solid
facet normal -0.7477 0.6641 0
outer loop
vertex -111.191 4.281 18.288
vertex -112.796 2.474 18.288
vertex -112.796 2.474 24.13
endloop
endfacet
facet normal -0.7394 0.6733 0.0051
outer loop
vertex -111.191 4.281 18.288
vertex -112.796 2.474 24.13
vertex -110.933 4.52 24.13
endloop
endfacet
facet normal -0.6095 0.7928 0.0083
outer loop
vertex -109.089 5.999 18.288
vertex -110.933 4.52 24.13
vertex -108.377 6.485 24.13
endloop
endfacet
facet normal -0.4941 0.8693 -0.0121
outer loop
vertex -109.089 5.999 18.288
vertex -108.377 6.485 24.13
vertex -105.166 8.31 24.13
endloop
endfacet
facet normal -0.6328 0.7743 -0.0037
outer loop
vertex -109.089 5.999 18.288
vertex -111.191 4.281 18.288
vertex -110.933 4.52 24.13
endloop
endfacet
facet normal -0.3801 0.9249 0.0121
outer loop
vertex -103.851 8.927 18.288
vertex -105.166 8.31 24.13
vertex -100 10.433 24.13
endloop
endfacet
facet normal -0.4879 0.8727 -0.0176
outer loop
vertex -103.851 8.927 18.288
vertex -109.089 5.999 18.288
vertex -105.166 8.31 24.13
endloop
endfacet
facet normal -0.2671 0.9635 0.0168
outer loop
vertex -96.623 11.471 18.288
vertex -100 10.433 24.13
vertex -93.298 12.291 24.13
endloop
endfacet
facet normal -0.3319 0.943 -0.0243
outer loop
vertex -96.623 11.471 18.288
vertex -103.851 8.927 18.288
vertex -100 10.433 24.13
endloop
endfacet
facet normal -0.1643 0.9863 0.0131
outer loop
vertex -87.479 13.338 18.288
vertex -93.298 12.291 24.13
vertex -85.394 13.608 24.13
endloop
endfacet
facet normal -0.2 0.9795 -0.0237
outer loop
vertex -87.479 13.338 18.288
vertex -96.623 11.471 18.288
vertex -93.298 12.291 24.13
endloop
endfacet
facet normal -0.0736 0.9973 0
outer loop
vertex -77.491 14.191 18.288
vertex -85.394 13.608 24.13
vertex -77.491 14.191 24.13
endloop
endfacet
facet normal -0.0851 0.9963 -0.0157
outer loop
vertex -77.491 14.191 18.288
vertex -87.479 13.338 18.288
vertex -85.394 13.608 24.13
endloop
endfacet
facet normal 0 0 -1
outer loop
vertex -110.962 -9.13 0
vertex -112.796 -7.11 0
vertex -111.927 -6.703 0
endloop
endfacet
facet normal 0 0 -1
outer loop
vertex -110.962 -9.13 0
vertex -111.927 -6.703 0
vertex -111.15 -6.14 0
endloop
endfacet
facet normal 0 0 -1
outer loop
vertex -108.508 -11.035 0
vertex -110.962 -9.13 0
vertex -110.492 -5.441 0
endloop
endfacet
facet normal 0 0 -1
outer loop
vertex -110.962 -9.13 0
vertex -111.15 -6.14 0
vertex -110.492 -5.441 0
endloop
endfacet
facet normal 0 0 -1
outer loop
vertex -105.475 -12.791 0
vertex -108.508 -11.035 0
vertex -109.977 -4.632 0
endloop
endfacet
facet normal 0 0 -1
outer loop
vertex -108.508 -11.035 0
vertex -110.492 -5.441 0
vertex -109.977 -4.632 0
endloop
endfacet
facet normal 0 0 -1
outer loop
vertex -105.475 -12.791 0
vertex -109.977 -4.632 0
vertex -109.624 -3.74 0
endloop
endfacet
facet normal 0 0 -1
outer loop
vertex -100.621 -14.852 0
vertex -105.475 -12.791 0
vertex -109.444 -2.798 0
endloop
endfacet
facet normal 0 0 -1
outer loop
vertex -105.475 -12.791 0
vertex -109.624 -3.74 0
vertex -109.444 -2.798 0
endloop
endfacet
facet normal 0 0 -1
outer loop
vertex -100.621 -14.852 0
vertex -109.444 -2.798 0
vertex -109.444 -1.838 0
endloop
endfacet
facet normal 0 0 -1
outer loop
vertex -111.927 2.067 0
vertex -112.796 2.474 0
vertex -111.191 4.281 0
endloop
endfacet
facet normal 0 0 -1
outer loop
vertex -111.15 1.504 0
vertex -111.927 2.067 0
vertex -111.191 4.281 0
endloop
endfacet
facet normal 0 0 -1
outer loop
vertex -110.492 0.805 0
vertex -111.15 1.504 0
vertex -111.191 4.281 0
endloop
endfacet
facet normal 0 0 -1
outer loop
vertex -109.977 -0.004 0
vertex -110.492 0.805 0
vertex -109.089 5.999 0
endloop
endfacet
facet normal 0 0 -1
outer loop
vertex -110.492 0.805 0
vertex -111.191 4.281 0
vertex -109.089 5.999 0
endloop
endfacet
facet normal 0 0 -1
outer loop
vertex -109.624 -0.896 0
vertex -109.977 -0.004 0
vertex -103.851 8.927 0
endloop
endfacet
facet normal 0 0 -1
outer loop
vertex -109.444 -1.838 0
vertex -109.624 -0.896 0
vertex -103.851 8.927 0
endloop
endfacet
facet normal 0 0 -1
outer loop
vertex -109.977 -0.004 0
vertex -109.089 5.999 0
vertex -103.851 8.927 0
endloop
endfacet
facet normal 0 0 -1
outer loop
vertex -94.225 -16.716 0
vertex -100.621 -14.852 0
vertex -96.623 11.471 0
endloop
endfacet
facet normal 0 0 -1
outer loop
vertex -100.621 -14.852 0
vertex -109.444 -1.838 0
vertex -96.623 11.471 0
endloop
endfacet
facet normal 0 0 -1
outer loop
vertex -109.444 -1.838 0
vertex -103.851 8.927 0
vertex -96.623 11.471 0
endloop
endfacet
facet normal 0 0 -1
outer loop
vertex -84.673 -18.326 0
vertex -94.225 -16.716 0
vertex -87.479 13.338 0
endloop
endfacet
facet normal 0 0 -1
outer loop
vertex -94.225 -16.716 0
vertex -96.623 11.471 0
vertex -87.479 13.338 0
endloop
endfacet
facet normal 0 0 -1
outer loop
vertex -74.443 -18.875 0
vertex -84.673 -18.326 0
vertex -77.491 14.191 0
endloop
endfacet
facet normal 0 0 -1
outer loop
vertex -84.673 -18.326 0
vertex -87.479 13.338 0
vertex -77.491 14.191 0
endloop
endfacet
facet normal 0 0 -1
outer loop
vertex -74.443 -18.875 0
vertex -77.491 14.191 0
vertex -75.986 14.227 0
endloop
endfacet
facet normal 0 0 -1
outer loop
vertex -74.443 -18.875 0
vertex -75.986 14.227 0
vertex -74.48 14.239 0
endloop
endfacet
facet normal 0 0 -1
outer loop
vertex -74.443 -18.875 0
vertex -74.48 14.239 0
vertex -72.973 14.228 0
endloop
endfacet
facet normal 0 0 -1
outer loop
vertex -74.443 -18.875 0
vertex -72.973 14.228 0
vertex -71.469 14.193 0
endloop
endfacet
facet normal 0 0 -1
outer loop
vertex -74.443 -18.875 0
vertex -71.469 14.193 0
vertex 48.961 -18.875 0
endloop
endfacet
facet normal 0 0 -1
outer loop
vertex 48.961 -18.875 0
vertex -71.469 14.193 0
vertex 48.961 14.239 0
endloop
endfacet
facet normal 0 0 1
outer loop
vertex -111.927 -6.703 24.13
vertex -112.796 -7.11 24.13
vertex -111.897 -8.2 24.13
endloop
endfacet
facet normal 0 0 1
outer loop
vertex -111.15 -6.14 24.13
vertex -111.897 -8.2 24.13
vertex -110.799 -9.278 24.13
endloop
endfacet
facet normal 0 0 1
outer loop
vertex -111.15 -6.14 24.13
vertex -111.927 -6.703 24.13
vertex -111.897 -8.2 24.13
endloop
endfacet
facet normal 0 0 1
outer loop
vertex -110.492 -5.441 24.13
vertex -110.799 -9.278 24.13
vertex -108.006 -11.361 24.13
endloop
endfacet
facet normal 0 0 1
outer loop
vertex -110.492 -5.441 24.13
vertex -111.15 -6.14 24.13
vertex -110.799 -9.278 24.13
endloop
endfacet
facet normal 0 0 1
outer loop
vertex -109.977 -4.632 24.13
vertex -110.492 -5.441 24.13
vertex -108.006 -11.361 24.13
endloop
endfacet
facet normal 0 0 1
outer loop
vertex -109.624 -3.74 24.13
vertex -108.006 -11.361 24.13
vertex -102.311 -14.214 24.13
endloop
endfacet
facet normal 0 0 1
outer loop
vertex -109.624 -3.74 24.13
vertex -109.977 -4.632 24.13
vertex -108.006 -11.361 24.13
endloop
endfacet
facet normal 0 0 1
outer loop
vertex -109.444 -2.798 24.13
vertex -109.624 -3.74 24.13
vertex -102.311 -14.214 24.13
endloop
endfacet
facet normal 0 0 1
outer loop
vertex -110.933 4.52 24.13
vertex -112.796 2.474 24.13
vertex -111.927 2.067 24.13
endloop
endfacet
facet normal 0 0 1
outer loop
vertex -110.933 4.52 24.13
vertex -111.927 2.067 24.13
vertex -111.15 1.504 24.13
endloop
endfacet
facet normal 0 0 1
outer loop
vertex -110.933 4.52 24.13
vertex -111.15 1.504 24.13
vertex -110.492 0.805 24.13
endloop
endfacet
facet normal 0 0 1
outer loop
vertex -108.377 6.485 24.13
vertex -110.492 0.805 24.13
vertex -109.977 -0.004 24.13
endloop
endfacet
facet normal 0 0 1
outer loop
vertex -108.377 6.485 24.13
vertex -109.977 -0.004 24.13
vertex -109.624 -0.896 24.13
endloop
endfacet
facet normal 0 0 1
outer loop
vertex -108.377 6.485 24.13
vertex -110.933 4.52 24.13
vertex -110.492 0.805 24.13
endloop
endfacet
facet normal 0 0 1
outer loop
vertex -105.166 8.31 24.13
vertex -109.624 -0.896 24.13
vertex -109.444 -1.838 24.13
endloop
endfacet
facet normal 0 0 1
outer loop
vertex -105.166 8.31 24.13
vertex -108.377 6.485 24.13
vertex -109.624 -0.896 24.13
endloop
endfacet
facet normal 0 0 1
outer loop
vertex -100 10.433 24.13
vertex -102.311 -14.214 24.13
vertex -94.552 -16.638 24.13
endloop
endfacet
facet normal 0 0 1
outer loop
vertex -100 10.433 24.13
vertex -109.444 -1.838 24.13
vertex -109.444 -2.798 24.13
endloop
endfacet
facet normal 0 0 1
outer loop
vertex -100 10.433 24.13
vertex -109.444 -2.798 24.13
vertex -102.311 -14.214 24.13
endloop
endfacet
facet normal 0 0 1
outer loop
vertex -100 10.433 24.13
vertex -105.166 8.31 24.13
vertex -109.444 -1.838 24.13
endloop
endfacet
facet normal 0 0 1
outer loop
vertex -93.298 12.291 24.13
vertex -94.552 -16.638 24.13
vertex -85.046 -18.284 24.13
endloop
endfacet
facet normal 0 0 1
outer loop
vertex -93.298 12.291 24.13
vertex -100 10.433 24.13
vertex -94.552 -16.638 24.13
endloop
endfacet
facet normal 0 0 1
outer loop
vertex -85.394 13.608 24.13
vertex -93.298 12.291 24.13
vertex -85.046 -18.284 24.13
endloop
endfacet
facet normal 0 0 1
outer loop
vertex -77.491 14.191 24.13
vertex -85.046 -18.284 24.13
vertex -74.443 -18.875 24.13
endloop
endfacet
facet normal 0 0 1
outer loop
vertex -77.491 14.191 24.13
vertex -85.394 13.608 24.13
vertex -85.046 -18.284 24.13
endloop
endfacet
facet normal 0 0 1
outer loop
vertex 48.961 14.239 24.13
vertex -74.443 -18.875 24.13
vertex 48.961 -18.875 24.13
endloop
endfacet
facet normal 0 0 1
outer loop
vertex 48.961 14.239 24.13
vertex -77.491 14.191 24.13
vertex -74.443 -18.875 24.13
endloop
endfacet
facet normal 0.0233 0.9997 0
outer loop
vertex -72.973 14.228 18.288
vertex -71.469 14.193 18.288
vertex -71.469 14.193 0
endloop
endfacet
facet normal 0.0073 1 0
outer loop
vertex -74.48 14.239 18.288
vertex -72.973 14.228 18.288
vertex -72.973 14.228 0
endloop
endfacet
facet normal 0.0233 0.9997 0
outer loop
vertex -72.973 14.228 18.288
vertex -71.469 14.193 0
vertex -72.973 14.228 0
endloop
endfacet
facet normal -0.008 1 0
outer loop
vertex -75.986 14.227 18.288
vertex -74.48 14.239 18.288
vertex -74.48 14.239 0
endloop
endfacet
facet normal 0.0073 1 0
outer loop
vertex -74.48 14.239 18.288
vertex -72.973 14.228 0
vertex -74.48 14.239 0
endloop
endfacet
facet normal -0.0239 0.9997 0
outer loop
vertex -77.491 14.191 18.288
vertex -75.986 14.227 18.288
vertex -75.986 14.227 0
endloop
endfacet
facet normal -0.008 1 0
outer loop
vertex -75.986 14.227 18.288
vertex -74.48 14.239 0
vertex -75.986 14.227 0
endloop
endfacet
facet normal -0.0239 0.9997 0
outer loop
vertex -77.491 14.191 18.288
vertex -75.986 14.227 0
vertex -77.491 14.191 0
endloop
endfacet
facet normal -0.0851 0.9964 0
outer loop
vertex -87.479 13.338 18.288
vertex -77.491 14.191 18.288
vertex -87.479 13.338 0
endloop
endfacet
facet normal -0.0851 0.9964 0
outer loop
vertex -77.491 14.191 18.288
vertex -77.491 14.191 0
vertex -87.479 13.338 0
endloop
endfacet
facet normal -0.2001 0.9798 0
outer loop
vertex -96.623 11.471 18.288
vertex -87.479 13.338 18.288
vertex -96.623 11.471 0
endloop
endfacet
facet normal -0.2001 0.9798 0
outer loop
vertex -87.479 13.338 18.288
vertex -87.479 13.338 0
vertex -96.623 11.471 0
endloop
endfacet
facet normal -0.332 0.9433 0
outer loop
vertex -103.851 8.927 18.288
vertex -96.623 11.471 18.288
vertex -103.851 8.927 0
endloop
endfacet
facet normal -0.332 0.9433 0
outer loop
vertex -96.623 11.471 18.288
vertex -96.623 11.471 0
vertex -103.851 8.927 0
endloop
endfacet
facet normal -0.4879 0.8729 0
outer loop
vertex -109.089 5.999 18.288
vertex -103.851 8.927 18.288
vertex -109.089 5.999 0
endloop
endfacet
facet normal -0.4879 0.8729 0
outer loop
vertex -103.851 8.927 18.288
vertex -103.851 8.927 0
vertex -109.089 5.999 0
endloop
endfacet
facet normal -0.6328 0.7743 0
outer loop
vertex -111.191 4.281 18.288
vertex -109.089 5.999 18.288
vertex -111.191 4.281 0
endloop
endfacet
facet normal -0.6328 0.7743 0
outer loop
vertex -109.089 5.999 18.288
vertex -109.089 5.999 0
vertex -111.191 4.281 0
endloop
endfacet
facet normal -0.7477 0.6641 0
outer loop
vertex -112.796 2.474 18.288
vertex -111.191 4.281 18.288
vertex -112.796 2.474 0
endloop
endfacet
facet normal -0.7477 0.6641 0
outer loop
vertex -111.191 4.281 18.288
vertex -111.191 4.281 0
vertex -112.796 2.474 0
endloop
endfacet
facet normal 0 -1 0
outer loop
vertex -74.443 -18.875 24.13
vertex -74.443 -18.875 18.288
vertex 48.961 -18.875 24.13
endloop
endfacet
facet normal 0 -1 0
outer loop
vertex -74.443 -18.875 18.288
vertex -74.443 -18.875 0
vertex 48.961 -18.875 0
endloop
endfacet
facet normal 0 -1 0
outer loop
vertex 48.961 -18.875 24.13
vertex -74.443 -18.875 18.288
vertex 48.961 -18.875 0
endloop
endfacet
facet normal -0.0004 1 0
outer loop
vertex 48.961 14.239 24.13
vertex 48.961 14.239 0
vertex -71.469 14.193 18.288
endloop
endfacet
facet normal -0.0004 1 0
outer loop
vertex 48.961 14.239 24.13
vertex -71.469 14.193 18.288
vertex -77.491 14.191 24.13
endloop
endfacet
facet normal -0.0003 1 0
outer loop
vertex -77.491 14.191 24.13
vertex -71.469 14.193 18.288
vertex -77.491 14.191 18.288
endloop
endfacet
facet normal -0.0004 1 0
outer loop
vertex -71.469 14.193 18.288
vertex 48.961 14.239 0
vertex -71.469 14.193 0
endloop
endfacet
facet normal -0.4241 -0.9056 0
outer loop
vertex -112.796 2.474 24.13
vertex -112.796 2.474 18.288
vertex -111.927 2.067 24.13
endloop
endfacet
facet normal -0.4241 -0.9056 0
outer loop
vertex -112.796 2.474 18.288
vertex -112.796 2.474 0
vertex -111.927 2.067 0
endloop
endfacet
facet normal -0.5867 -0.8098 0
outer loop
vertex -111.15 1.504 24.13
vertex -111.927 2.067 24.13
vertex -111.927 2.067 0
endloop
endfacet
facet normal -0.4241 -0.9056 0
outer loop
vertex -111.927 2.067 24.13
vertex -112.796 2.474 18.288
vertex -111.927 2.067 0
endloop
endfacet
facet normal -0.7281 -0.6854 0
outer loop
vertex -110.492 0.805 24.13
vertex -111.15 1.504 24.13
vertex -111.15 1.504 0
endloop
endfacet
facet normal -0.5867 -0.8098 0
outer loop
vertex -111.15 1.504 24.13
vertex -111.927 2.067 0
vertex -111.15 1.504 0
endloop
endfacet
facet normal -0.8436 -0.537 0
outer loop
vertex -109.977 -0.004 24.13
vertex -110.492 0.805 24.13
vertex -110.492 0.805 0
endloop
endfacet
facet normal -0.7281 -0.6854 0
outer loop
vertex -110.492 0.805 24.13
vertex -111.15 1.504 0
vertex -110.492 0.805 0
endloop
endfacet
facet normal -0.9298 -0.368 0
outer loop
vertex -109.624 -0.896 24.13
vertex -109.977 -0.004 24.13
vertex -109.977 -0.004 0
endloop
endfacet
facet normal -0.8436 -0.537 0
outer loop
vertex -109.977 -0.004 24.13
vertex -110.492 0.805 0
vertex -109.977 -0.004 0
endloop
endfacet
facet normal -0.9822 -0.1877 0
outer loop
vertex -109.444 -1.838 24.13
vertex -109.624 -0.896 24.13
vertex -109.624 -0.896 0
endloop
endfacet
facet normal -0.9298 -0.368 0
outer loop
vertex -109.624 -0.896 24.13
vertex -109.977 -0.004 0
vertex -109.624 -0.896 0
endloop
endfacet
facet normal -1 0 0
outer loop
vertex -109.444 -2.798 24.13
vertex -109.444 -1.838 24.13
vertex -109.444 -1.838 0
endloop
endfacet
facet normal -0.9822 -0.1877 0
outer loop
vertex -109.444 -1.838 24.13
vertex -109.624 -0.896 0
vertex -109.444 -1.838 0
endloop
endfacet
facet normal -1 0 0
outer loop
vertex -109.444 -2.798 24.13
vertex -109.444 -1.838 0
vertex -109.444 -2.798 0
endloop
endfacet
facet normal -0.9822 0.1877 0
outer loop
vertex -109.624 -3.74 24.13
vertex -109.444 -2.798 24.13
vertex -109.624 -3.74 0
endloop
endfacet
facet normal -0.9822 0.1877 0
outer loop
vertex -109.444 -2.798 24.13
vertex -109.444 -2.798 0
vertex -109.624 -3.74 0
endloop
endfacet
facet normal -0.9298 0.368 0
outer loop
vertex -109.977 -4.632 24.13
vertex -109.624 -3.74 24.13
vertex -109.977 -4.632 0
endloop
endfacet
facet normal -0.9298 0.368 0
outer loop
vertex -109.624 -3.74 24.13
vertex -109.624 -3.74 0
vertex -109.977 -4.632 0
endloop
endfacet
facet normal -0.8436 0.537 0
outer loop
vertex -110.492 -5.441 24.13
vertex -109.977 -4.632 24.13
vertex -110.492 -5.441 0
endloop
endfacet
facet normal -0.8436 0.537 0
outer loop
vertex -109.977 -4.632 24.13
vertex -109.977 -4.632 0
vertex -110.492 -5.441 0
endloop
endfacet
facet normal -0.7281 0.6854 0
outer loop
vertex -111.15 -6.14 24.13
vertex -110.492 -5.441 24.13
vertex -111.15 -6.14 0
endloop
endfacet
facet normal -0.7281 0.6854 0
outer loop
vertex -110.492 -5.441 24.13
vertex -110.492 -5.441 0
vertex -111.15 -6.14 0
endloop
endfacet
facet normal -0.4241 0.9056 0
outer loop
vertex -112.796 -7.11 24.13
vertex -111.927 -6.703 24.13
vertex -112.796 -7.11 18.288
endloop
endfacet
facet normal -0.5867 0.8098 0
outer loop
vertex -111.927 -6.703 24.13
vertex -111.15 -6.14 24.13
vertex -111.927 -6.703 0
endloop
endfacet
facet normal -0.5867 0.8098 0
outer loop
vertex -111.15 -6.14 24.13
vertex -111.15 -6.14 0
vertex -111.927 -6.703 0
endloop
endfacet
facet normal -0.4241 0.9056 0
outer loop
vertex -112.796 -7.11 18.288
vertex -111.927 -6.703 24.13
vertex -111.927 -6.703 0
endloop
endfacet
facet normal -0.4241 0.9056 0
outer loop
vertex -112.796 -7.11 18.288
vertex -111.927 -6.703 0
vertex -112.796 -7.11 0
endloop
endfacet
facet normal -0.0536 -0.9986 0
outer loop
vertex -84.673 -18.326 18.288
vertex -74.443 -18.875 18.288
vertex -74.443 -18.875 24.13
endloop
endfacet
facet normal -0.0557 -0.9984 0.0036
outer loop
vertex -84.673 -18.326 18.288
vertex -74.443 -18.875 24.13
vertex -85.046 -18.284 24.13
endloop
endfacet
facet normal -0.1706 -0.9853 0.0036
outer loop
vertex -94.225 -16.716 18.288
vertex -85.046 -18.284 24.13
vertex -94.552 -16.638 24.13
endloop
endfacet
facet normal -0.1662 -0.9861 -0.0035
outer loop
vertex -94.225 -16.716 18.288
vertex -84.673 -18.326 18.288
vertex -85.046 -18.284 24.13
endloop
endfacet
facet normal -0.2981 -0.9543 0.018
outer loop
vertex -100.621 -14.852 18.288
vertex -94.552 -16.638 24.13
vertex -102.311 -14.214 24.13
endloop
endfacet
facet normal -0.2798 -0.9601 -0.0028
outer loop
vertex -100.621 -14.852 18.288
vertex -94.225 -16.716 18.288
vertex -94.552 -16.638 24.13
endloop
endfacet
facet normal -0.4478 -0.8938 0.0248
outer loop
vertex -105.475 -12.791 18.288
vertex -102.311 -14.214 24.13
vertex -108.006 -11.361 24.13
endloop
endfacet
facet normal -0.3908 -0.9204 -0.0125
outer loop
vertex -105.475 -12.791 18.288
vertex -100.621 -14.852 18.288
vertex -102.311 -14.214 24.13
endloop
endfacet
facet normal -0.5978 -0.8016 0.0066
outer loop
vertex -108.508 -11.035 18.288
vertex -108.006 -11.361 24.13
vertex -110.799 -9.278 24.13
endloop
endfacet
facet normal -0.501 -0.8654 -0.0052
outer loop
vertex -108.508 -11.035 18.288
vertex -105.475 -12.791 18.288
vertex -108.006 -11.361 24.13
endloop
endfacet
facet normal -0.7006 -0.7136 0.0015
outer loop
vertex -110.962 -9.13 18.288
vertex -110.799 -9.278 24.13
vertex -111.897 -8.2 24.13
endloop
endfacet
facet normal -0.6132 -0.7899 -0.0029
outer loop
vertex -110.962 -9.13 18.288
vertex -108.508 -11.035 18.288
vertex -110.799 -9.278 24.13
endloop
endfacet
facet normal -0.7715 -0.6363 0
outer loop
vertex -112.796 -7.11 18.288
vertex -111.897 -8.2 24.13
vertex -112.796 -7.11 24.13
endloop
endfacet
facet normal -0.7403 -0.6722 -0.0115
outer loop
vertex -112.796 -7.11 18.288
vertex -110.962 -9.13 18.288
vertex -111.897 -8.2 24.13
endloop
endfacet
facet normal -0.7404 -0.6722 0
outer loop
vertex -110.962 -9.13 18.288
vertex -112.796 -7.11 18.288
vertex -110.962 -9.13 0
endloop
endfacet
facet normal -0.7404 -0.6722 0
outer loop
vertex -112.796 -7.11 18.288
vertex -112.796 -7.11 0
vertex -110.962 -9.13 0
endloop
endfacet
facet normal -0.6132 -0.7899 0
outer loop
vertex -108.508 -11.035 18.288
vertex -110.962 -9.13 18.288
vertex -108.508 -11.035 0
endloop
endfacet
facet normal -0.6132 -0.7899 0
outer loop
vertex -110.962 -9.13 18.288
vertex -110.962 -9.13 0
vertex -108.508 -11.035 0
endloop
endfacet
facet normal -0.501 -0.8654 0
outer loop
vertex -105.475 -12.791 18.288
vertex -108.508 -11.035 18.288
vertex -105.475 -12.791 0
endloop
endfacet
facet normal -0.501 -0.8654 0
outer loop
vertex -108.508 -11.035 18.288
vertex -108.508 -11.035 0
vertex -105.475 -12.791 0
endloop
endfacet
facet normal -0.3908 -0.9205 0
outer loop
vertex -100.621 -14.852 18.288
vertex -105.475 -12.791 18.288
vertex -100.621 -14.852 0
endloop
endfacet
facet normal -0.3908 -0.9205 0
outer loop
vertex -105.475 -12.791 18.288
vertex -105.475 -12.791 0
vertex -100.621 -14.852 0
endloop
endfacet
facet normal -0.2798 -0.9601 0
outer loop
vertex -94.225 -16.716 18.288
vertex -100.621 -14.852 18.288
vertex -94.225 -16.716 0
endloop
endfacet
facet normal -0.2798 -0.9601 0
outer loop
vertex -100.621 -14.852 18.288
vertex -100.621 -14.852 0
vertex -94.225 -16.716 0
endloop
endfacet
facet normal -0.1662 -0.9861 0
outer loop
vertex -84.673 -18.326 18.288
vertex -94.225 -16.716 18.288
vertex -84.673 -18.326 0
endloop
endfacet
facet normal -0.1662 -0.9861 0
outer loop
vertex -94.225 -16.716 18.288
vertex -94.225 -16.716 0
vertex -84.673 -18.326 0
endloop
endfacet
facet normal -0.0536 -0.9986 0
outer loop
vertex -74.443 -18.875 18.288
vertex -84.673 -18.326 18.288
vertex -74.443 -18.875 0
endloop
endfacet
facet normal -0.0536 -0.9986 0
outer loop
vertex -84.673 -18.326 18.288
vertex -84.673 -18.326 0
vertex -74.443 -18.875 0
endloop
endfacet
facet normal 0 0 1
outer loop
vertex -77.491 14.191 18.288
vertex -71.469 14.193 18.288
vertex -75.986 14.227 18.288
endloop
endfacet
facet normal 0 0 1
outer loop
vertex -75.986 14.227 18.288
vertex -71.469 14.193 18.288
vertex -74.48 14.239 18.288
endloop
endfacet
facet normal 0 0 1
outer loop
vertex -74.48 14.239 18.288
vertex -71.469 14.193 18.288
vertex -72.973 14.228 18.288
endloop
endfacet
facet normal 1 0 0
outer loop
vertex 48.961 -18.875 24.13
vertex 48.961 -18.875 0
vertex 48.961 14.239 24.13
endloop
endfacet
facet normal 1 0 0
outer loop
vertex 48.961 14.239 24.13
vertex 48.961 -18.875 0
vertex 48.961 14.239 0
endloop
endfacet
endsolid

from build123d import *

# Parameters (mm, degrees)
SKETCH1_RX          = 40.067331288
SKETCH1_RY          = 16.556748466
BOSS_EXTRUDE1_DEPTH = 18.288
BOSS_EXTRUDE2_DEPTH = 24.13
SKETCH4_R           = 5.089278313
CUT_EXTRUDE1_DEPTH  = 49.784


with BuildPart() as part:
    # Sketch1 → Boss-Extrude1 (new body)
    with BuildSketch(Plane.XY):
        with Locations(Location((-74.44297323, -2.317944785), (0, 0, 180))):
            Ellipse(SKETCH1_RX, SKETCH1_RY)
    extrude(amount=BOSS_EXTRUDE1_DEPTH)

    # Sketch3 → Boss-Extrude2 (add)
    with BuildSketch(Plane(origin=(0, 0, 0), x_dir=(-1, 0, 0), z_dir=(0, 0, -1))):
        with BuildLine():
            Line((74.44297323, -18.874693252), (-48.961371747, -18.874693252))
            Line((-48.961371747, -18.874693252), (-48.961371747, 14.238803681))
            Line((-48.961371747, 14.238803681), (77.490698265, 14.190836373))
            add(Edge.make_bspline(
                [(74.44297323, -18.874693252), (113.013283161, -18.874693252), (114.48127378, -2.948096616), (115.949264398, 12.978500019), (77.490698265, 14.190836373)],
                knots=[4.71238898, 4.71238898, 4.71238898, 6.245115993, 6.245115993, 7.777843005, 7.777843005, 7.777843005], degree=2, weights=[1, 0.720437409, 1, 0.720437409, 1]))
        make_face()
    extrude(amount=-BOSS_EXTRUDE2_DEPTH)

    # Sketch4 → Cut-Extrude1 (cut)
    with BuildSketch(Plane(origin=(0, 0, 0), x_dir=(-1, 0, 0), z_dir=(0, 0, -1))):
        with Locations((114.510304518, -2.317944785)):
            Circle(SKETCH4_R)
    extrude(amount=-CUT_EXTRUDE1_DEPTH, mode=Mode.SUBTRACT)


solid = part.part
